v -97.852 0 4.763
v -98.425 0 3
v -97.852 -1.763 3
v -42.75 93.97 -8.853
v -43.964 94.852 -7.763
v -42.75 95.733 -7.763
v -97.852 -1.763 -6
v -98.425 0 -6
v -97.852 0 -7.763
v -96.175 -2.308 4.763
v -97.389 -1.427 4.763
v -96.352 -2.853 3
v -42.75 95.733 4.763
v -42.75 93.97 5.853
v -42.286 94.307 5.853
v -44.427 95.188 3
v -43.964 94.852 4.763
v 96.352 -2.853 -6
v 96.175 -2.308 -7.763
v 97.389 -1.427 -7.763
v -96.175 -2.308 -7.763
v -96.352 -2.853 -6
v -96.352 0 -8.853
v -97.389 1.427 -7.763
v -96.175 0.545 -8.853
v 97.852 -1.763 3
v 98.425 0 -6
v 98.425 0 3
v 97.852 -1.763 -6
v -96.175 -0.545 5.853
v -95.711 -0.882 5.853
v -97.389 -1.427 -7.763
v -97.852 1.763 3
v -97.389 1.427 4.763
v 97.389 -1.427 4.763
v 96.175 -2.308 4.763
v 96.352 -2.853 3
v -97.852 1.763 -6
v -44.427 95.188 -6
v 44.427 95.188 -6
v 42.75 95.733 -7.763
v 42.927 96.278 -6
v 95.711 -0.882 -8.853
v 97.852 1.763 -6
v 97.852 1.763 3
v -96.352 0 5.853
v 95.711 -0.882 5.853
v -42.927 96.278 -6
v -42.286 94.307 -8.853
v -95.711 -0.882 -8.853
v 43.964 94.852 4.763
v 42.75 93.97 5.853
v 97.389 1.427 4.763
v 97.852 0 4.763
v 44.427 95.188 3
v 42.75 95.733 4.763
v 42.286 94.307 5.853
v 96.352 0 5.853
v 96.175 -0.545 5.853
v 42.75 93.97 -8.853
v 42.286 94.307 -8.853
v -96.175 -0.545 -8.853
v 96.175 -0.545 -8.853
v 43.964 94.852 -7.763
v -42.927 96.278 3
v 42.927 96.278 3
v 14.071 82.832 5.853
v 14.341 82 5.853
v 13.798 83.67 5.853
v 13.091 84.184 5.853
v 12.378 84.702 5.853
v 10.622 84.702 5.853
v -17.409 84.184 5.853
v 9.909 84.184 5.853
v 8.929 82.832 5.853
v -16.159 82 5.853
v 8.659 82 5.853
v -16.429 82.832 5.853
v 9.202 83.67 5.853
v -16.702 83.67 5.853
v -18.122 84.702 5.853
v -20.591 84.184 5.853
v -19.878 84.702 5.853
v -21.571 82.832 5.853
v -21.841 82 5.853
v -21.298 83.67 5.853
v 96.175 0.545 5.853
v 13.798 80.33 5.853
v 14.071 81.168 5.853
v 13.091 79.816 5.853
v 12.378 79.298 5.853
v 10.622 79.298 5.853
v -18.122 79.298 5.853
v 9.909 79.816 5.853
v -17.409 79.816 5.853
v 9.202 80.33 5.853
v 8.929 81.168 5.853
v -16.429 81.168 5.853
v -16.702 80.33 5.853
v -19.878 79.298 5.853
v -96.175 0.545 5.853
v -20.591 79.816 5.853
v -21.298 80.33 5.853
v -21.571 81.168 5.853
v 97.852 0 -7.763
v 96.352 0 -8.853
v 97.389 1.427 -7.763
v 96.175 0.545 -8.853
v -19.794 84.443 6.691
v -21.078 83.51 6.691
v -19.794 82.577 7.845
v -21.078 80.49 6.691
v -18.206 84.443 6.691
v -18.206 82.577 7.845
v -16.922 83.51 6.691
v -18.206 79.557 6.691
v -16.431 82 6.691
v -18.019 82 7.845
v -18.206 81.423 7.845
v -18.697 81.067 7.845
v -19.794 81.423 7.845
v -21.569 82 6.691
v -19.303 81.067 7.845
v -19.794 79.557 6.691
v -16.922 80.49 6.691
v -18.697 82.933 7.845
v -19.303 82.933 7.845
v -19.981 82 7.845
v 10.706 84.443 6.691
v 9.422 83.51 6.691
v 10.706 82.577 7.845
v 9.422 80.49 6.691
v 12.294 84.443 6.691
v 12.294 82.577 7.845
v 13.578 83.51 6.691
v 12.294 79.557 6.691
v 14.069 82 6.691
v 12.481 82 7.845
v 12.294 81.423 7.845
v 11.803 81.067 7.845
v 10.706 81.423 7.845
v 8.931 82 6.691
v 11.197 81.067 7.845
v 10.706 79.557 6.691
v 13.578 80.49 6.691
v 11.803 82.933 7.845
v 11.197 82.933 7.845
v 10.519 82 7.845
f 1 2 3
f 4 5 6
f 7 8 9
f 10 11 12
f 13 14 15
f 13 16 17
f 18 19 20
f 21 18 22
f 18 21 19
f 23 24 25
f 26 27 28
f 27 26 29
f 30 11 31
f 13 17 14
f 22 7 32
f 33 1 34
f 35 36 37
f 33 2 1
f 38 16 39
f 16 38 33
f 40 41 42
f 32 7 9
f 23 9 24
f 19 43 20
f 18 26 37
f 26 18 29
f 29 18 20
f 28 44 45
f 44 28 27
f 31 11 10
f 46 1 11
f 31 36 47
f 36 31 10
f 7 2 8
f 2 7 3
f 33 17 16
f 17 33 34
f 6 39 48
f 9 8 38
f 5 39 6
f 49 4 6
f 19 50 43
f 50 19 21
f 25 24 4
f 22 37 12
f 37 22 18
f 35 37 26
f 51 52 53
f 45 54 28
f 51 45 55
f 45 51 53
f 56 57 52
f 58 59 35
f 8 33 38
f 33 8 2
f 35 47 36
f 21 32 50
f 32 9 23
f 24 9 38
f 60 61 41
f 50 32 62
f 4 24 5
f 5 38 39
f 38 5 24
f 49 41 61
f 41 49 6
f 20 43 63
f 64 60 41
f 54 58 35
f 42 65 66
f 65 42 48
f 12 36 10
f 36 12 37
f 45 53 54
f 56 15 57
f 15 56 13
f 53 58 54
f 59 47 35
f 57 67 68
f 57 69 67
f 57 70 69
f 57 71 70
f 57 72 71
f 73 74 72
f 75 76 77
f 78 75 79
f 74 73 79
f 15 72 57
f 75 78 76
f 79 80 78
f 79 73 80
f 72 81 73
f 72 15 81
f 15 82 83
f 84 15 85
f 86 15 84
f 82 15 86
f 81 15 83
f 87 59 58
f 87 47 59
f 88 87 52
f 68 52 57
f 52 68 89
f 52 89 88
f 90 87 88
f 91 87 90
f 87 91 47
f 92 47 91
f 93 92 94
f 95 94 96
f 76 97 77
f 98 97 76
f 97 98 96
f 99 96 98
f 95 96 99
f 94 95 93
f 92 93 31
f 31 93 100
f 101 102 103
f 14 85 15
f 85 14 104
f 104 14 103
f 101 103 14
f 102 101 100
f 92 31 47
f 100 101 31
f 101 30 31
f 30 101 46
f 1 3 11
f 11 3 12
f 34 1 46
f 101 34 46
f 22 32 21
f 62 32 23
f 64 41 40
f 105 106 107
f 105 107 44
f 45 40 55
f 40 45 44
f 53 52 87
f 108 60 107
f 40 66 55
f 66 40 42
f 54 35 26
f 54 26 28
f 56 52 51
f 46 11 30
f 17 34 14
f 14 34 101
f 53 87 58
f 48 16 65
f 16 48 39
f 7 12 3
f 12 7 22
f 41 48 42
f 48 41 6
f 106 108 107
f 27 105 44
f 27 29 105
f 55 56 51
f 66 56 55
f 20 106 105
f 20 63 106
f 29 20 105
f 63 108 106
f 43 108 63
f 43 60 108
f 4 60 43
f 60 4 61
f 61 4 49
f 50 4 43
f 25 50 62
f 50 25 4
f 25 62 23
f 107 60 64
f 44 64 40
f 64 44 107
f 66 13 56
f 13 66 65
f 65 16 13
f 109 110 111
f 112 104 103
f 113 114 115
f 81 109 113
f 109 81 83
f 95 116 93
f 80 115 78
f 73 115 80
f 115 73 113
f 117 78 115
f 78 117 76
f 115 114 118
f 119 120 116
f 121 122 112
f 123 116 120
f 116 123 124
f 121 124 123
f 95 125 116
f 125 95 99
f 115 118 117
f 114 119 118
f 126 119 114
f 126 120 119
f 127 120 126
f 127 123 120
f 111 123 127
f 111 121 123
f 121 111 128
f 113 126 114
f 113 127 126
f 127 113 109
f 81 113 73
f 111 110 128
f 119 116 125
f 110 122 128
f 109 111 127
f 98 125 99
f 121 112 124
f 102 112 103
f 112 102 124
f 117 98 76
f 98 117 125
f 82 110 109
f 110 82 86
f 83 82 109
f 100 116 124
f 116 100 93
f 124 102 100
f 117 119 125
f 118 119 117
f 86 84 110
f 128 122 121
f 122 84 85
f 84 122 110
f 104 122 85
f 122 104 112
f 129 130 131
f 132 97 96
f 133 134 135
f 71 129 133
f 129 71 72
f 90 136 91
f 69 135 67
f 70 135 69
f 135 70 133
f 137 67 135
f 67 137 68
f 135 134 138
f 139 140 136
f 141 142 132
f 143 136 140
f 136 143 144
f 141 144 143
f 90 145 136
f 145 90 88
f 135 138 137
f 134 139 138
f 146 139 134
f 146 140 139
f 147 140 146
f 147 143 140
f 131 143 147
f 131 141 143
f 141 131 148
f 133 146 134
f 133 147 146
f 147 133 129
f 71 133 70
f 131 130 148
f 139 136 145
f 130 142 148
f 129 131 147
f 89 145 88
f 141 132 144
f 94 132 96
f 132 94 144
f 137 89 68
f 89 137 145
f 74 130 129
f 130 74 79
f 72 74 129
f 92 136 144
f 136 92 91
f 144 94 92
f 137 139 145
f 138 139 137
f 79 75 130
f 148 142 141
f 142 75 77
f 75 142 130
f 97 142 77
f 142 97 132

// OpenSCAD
// This is a Bench Plate Mounting Block. The Bent Plate design
// is purely experimental. It will be difficult for most printers to
// render due to the extreme overhang.
//
// Warning -- some sanding and fitting may be required.
//
// This is licensed under the creative commons+attribution license
//
// This design was inspired by dhench's Lee Bench Plates design at
// https://www.thingiverse.com/thing:2933054
//
// To fulfill the attribution requirement, please link to:
// http://www.thingiverse.com/thing:3028704

/* [Main] */

// Number of facets (larger numbers provide better smoothing)
$fn=10;

// Define shape of object
shape=0;//[0:Block,1:Bent Plate]

// Define press type
device=0;//[0:Alignment Tabs Only,1:Classic Turret Press,2:Load-Master,3:Breech Lock Reloader Press,4:Breech Lock Challenger,5:Breech Lock Classic Cast,6:Classic Cast,7:Pro 1000,8:4 Hole Value Turret,9:2018+ Pro 1000,10:2018+ 4 Hole Value Turret,11:RCBS Rock Chucker,12:RCBS Partner,13:Brass Prep Station Mk I,14:Brass Prep Station Mk II,15:Brass Prep Station Mk III]

// Bolt hole diameter in mm
bolt_diameter=6.35;

// Bolt head diameter in mm
head_diameter=4*bolt_diameter;

// Bolt head thickness in mm
head_thickness=3.0;

// Base plate thickness in mm
thickness=18.0;

// Corner radius in mm
radius=3.0;

// Bottom base plate width in mm
bottom_width=196.85;

// Top base plate width in mm
top_width=90.0;

// Base plate length (top to bottom) in mm
length=96.425;

//rotation_angle=atan((bottom_width-top_width)/2*length)-30;

module lable(text_input)
{
    #translate([bottom_width/2-2*radius,0,0]) rotate([90,180,0]) linear_extrude(radius)
    {
        text(text_input,size=5,center=false);
    }
}

module corner(corner_height,corner_radius)
{
    hull()
    {
        translate([0,0,-(corner_height-4*corner_radius)]) sphere(r=corner_radius,center=true);
        translate([0,0,corner_radius]) sphere(r=corner_radius,center=true);
    }
}

module brace(brace_side,brace_radius)
{
    hull()
    {
        translate([0,-brace_side/2,0]) sphere(r=brace_radius,center=true);
        translate([0,brace_side/2],0)  sphere(r=brace_radius,center=true);
        translate([0,-brace_side/2,brace_side/2]) sphere(r=brace_radius,center=true);
        translate([0,brace_side/2,brace_side/2])  sphere(r=brace_radius,center=true);
        translate([brace_side/2,-brace_side/2,0]) sphere(r=brace_radius,center=true);
        translate([brace_side/2,brace_side/2],0)  sphere(r=brace_radius,center=true);
        
    }
}

module base()
{
    if(shape==0)
    {
        hull()
        {
            translate([-(bottom_width/2-radius),0,0])   corner(thickness,radius);
            translate([(bottom_width/2-radius),0,0])  corner(thickness,radius);
            translate([-(top_width/2-radius),(length-radius),0])  corner(thickness,radius);
            translate([(top_width/2-radius),(length-radius),0]) corner(thickness,radius);
        }
        // Add alignment tabs
        translate([-19,82,thickness/2-(bolt_diameter/2+1)])  sphere(r=bolt_diameter/2,center=true);
        translate([11.5,82,thickness/2-(bolt_diameter/2+1)]) sphere(r=bolt_diameter/2,center=true);
    }
    if(shape==1)
    {   
        union()
        {
            hull()
            {
                translate([-(bottom_width/2-radius),0,0])   corner(thickness,radius);
                translate([-(top_width/2-radius),(length-radius),0])  corner(thickness,radius);
            }
            hull()
            {
                translate([(bottom_width/2-radius),0,0])  corner(thickness,radius);
                translate([(top_width/2-radius),(length-radius),0]) corner(thickness,radius);
            }
            hull()
            {
                translate([-(bottom_width/2-radius),0,-head_thickness/2]) corner(radius,radius/2);
                translate([(bottom_width/2-radius),0,-head_thickness/2])  corner(radius,radius/2);
                translate([-(top_width/2-radius),(length-radius),-head_thickness/2]) corner(radius,radius/2);
                translate([(top_width/2-radius),(length-radius-radius),-head_thickness/2])  corner(radius,radius/2);
            }
            // Render braces
            translate([(bottom_width-top_width)/sqrt(3)-6,2*length/3,-radius/2]) rotate([0,90,211]) brace(5,radius);
            translate([-((bottom_width-top_width)/sqrt(3)-6),2*length/3,-radius/2]) rotate([0,90,-29]) brace(5,radius);
            translate([(4*(bottom_width-top_width)/sqrt(3)/3-8),length/3,-radius/2]) rotate([0,90,211]) brace(5,radius);
            translate([-(4*(bottom_width-top_width)/sqrt(3)/3-8),length/3,-radius/2]) rotate([0,90,-29]) brace(5,radius);
        }
    }
}

module ctp()
{
    union()
    {
        translate([-47.0,14.0,0]) cube([bolt_diameter+0.5,bolt_diameter+0.5,thickness+radius],center=true);
        translate([71.0,14.0,0])  cube([bolt_diameter+0.5,bolt_diameter+0.5,thickness+radius],center=true);
        translate([11.5,82,0])    cube([bolt_diameter+0.5,bolt_diameter+0.5,thickness+radius],center=true);
        if(shape==0)
        {
            lable("Lee Classic Turret Press");
            // Countersink carriage bolts
            translate([-47.0,14.0,head_thickness]) cylinder(r=head_diameter/2,h=head_thickness,center=false);
            translate([71.0,14.0,head_thickness])  cylinder(r=head_diameter/2,h=head_thickness,center=false);
            translate([11.5,82.0,head_thickness])  cylinder(r=head_diameter/2,h=head_thickness,center=false);
        }
    }
}

module lm()
{
    union()
    {
        translate([-70.0,10.0,0]) cube([bolt_diameter+0.5,bolt_diameter+0.5,thickness+radius],center=true);
        translate([32.0,10.0,0])  cube([bolt_diameter+0.5,bolt_diameter+0.5,thickness+radius],center=true);
        translate([-19.0,82.0,0]) cube([bolt_diameter+0.5,bolt_diameter+0.5,thickness+radius],center=true);
        if(shape==0)
        {
            lable("Lee Load-Master");
            // Countersink carriage bolts
            translate([-70.0,10.0,head_thickness]) cylinder(r=head_diameter/2,h=head_thickness,center=false);
            translate([32.0,10.0,head_thickness])  cylinder(r=head_diameter/2,h=head_thickness,center=false);
            translate([-19.0,82.0,head_thickness]) cylinder(r=head_diameter/2,h=head_thickness,center=false);   
        }
    }
}

module rp()
{
    union()
    {
        translate([-19.0,10.0,0]) cube([bolt_diameter+0.5,bolt_diameter+0.5,thickness+radius],center=true);
        translate([19.0,10.0,0])  cube([bolt_diameter+0.5,bolt_diameter+0.5,thickness+radius],center=true);
        translate([0.0,72.0,0])   cube([bolt_diameter+0.5,bolt_diameter+0.5,thickness+radius],center=true);
        if(shape==0)
        {
            lable("Lee Breech Lock Reloader Press");
            // Countersink carriage bolts
            translate([-19.0,10.0,head_thickness]) cylinder(r=head_diameter/2+0.5,h=head_thickness,center=false);
            translate([19.0,10.0,head_thickness])  cylinder(r=head_diameter/2+0.5,h=head_thickness,center=false);
            translate([0.0,72.0,head_thickness])   cylinder(r=head_diameter/2+0.5,h=head_thickness,center=false);
        }
    }
}

module blc()
{
    union()
    {
        translate([-37.0,37.0,0]) cube([bolt_diameter+0.5,bolt_diameter+0.5,thickness+radius],center=true);
        translate([8.0,13.0,0])   cube([bolt_diameter+0.5,bolt_diameter+0.5,thickness+radius],center=true);
        translate([-15.0,67.0,0]) cube([bolt_diameter+0.5,bolt_diameter+0.5,thickness+radius],center=true);
        if(shape==0)
        {
            lable("Lee Breech Lock Challenger Press");
            // Countersink carriage bolts
            translate([-37.0,37.0,head_thickness]) cylinder(r=head_diameter/2,h=head_thickness,center=false);
            translate([8.0,13.0,head_thickness])   cylinder(r=head_diameter/2,h=head_thickness,center=false);
            translate([-15.0,67.0,head_thickness]) cylinder(r=head_diameter/2,h=head_thickness,center=false);
        }
    }
}

module blcc()
{
    union()
    {
        translate([-53.0,39.5,0]) cube([bolt_diameter+0.5,bolt_diameter+0.5,thickness+radius],center=true);
        translate([32.0,10.0,0])  cube([bolt_diameter+0.5,bolt_diameter+0.5,thickness+radius],center=true);
        translate([-19.0,82.0,0]) cube([bolt_diameter+0.5,bolt_diameter+0.5,thickness+radius],center=true);
        if(shape==0)
        {
            lable("Lee Breech Lock Classic Cast");
            // Countersink carriage bolts
            translate([-53.0,39.5,head_thickness]) cylinder(r=head_diameter/2,h=head_thickness,center=false);
            translate([32.0,10.0,head_thickness])  cylinder(r=head_diameter/2,h=head_thickness,center=false);
            translate([-19.0,82.0,head_thickness]) cylinder(r=head_diameter/2,h=head_thickness,center=false);   
        }
    }
}

module cc()
{
    union()
    {
        translate([-70.0,10.0,0]) cube([bolt_diameter+0.5,bolt_diameter+0.5,thickness+radius],center=true);
        translate([32.0,10.0,0])  cube([bolt_diameter+0.5,bolt_diameter+0.5,thickness+radius],center=true);
        translate([-19.0,82.0,0]) cube([bolt_diameter+0.5,bolt_diameter+0.5,thickness+radius],center=true);
        if(shape==0)
        {
            lable("Lee Classic Cast");
            // Countersink carriage bolts
            translate([-70.0,10.0,head_thickness]) cylinder(r=head_diameter/2,h=head_thickness,center=false);
            translate([32.0,10.0,head_thickness])  cylinder(r=head_diameter/2,h=head_thickness,center=false);
            translate([-19.0,82.0,head_thickness]) cylinder(r=head_diameter/2,h=head_thickness,center=false);
        }
    }
}

module pro()
{
    union()
    {
        translate([-70.0,10.0,0]) cube([bolt_diameter+0.5,bolt_diameter+0.5,thickness+radius],center=true);
        translate([32.0,10.0,0])  cube([bolt_diameter+0.5,bolt_diameter+0.5,thickness+radius],center=true);
        translate([-19.0,82.0,0]) cube([bolt_diameter+0.5,bolt_diameter+0.5,thickness+radius],center=true);
        if(shape==0)
        {
            lable("Lee Pro 1000");
            // Countersink carriage bolts
            translate([-70.0,10.0,head_thickness]) cylinder(r=head_diameter/2,h=head_thickness,center=false);
            translate([32.0,10.0,head_thickness])  cylinder(r=head_diameter/2,h=head_thickness,center=false);
            translate([-19.0,82.0,head_thickness]) cylinder(r=head_diameter/2,h=head_thickness,center=false);
        }
    }
}

module vtp()
{
    union()
    {
        translate([-70.0,10.0,0]) cube([bolt_diameter+0.5,bolt_diameter+0.5,thickness+radius],center=true);
        translate([32.0,10.0,0])  cube([bolt_diameter+0.5,bolt_diameter+0.5,thickness+radius],center=true);
        translate([-19.0,82.0,0]) cube([bolt_diameter+0.5,bolt_diameter+0.5,thickness+radius],center=true);
        if(shape==0)
        {
            lable("Lee Value Turret Press");
            // Countersink carriage bolts
            translate([-70.0,10.0,head_thickness]) cylinder(r=head_diameter/2,h=head_thickness,center=false);
            translate([32.0,10.0,head_thickness])  cylinder(r=head_diameter/2,h=head_thickness,center=false);
            translate([-19.0,82.0,head_thickness]) cylinder(r=head_diameter/2,h=head_thickness,center=false);
        }
    }
}

module lee18vtp()
{
    union()
    {
        translate([-59.0,14.0,0]) cube([bolt_diameter+0.5,bolt_diameter+0.5,thickness+radius],center=true);
        translate([32.0,10.0,0])  cube([bolt_diameter+0.5,bolt_diameter+0.5,thickness+radius],center=true);
        translate([-15.0,67.0,0]) cube([bolt_diameter+0.5,bolt_diameter+0.5,thickness+radius],center=true);
        if(shape==0)
        {
            lable("2018+ Lee Value Turret Press");
            // Countersink carriage bolts
            translate([-59.0,14.0,head_thickness]) cylinder(r=head_diameter/2,h=head_thickness,center=false);
            translate([32.0,10.0,head_thickness])  cylinder(r=head_diameter/2,h=head_thickness,center=false);
            translate([-15.0,67.0,head_thickness]) cylinder(r=head_diameter/2,h=head_thickness,center=false);
         }
    }
}


module rc()
{
    union()
    {
        translate([-34.0,42.0,0]) cube([bolt_diameter+0.5,bolt_diameter+0.5,thickness+radius],center=true);
        translate([34.0,42.0,0])  cube([bolt_diameter+0.5,bolt_diameter+0.5,thickness+radius],center=true);
        if(shape==0)
        {
            lable("RCBS Rock Chucker");
            // Countersink carriage bolts
            translate([-34.0,42.0,head_thickness]) cylinder(r=head_diameter/2,h=head_thickness,center=false);
            translate([34.0,42.0,head_thickness])  cylinder(r=head_diameter/2,h=head_thickness,center=false);
        }
    }
}

module partner()
{
    union()
    {
        translate([-21.0,19.0,0]) cube([bolt_diameter+0.5,bolt_diameter+0.5,thickness+radius],center=true);
        translate([21.0,19.0,0])  cube([bolt_diameter+0.5,bolt_diameter+0.5,thickness+radius],center=true);
        translate([0.0,65.0,0]) cube([bolt_diameter+0.5,bolt_diameter+0.5,thickness+radius],center=true);
        if(shape==0)
        {
            lable("RCBS Partner");
            // Countersink carriage bolts
            translate([-21.0,19.0,head_thickness]) cylinder(r=head_diameter/2,h=head_thickness,center=false);
            translate([21.0,19.0,head_thickness])  cylinder(r=head_diameter/2,h=head_thickness,center=false);
            translate([0.0,65.0,head_thickness]) cylinder(r=head_diameter/2,h=head_thickness,center=false);
        }
    }
}

module brassprep_a()
{
    union()
    {
        #translate([0,65.0,0]) cylinder($fn=50,r=6.35,h=thickness+radius,center=true);
        #translate([-20,40.0,0]) cylinder($fn=50,r=7.2,h=thickness+radius,center=true);
        #translate([-20,40.0,-0.75*thickness]) cylinder($fn=50,r=8.86,h=thickness+radius,center=true);
        #translate([20,40.0,0]) cylinder($fn=50,r=7.2,h=thickness+radius,center=true);
        #translate([20,40.0,-0.75*thickness]) cylinder($fn=50,r=8.86,h=thickness+radius,center=true);
        #translate([0,15.0,-thickness]) cylinder($fn=6,r=3.65,h=thickness+radius,center=false);
        #translate([20,15.0,-thickness]) cylinder($fn=6,r=3.65,h=thickness+radius,center=false);
        #translate([-20,15.0,-thickness]) cylinder($fn=6,r=3.65,h=thickness+radius,center=false);
        #translate([40,15.0,-thickness]) cylinder($fn=6,r=3.65,h=thickness+radius,center=false);
        #translate([-40,15.0,-thickness]) cylinder($fn=6,r=3.65,h=thickness+radius,center=false);
        #translate([60,15.0,-thickness]) cylinder($fn=6,r=3.65,h=thickness+radius,center=false);
        #translate([-60,15.0,-thickness]) cylinder($fn=6,r=3.65,h=thickness+radius,center=false);
        if(shape==0)
        {
            lable("Brass Prep Station MK I");
        }
    }
}
module brassprep_b()
{
    union()
    {
        #translate([0,65.0,0]) cylinder($fn=50,r=6.35,h=thickness+radius+1,center=true);
        #translate([-20,40.0,0]) cylinder($fn=6,r=3.65,h=thickness+radius+1,center=true);
        #translate([20,40.0,0]) cylinder($fn=6,r=3.65,h=thickness+radius+1,center=true);
        
        #translate([0,15.0,-thickness]) cylinder($fn=6,r=3.65,h=thickness+radius+1,center=false);
        #translate([20,15.0,-thickness]) cylinder($fn=6,r=3.65,h=thickness+radius+1,center=false);
        #translate([-20,15.0,-thickness]) cylinder($fn=6,r=3.65,h=thickness+radius+1,center=false);
        #translate([40,15.0,-thickness]) cylinder($fn=6,r=3.65,h=thickness+radius+1,center=false);
        #translate([-40,15.0,-thickness]) cylinder($fn=6,r=3.65,h=thickness+radius+1,center=false);
        #translate([60,15.0,-thickness]) cylinder($fn=6,r=3.65,h=thickness+radius+1,center=false);
        #translate([-60,15.0,-thickness]) cylinder($fn=6,r=3.65,h=thickness+radius+1,center=false);
        if(shape==0)
        {
            lable("Brass Prep Station Mk II");
        }
    }
}

module brassprep_c()
{
    union()
    {
        #translate([0,65.0,0]) cylinder($fn=6,r=3.65,h=thickness+radius+1,center=true);
        #translate([-20,40.0,0]) cylinder($fn=6,r=3.65,h=thickness+radius+1,center=true);
        #translate([20,40.0,0]) cylinder($fn=6,r=3.65,h=thickness+radius+1,center=true);
        
        #translate([0,15.0,-thickness]) cylinder($fn=6,r=3.65,h=thickness+radius+1,center=false);
        #translate([20,15.0,-thickness]) cylinder($fn=6,r=3.65,h=thickness+radius+1,center=false);
        #translate([-20,15.0,-thickness]) cylinder($fn=6,r=3.65,h=thickness+radius+1,center=false);
        #translate([40,15.0,-thickness]) cylinder($fn=6,r=3.65,h=thickness+radius+1,center=false);
        #translate([-40,15.0,-thickness]) cylinder($fn=6,r=3.65,h=thickness+radius+1,center=false);
        #translate([60,15.0,-thickness]) cylinder($fn=6,r=3.65,h=thickness+radius+1,center=false);
        #translate([-60,15.0,-thickness]) cylinder($fn=6,r=3.65,h=thickness+radius+1,center=false);
        if(shape==0)
        {
            lable("Brass Prep Station Mk III");
        }
    }
}
//%translate([0,length/2,-thickness]) import_stl("./LeePlateComp.stl");

difference() // drill holes using correct pattern for each device
{
    base();
    if(device==1){ ctp(); }
    if(device==2){ lm(); }
    if(device==3){ rp(); }
    if(device==4){ blc(); }
    if(device==5){ blcc(); }
    if(device==6){ cc(); }
    if(device==7){ pro(); }
    if(device==8){ vtp(); }
    if(device==9){ lee18pro(); }
    if(device==10){ lee18vtp(); }
    if(device==11){ rc(); }
    if(device==12){ partner(); }
    if(device==13){ brassprep_a(); }
    if(device==14){ brassprep_b(); }
    if(device==15){ brassprep_c(); }
}
